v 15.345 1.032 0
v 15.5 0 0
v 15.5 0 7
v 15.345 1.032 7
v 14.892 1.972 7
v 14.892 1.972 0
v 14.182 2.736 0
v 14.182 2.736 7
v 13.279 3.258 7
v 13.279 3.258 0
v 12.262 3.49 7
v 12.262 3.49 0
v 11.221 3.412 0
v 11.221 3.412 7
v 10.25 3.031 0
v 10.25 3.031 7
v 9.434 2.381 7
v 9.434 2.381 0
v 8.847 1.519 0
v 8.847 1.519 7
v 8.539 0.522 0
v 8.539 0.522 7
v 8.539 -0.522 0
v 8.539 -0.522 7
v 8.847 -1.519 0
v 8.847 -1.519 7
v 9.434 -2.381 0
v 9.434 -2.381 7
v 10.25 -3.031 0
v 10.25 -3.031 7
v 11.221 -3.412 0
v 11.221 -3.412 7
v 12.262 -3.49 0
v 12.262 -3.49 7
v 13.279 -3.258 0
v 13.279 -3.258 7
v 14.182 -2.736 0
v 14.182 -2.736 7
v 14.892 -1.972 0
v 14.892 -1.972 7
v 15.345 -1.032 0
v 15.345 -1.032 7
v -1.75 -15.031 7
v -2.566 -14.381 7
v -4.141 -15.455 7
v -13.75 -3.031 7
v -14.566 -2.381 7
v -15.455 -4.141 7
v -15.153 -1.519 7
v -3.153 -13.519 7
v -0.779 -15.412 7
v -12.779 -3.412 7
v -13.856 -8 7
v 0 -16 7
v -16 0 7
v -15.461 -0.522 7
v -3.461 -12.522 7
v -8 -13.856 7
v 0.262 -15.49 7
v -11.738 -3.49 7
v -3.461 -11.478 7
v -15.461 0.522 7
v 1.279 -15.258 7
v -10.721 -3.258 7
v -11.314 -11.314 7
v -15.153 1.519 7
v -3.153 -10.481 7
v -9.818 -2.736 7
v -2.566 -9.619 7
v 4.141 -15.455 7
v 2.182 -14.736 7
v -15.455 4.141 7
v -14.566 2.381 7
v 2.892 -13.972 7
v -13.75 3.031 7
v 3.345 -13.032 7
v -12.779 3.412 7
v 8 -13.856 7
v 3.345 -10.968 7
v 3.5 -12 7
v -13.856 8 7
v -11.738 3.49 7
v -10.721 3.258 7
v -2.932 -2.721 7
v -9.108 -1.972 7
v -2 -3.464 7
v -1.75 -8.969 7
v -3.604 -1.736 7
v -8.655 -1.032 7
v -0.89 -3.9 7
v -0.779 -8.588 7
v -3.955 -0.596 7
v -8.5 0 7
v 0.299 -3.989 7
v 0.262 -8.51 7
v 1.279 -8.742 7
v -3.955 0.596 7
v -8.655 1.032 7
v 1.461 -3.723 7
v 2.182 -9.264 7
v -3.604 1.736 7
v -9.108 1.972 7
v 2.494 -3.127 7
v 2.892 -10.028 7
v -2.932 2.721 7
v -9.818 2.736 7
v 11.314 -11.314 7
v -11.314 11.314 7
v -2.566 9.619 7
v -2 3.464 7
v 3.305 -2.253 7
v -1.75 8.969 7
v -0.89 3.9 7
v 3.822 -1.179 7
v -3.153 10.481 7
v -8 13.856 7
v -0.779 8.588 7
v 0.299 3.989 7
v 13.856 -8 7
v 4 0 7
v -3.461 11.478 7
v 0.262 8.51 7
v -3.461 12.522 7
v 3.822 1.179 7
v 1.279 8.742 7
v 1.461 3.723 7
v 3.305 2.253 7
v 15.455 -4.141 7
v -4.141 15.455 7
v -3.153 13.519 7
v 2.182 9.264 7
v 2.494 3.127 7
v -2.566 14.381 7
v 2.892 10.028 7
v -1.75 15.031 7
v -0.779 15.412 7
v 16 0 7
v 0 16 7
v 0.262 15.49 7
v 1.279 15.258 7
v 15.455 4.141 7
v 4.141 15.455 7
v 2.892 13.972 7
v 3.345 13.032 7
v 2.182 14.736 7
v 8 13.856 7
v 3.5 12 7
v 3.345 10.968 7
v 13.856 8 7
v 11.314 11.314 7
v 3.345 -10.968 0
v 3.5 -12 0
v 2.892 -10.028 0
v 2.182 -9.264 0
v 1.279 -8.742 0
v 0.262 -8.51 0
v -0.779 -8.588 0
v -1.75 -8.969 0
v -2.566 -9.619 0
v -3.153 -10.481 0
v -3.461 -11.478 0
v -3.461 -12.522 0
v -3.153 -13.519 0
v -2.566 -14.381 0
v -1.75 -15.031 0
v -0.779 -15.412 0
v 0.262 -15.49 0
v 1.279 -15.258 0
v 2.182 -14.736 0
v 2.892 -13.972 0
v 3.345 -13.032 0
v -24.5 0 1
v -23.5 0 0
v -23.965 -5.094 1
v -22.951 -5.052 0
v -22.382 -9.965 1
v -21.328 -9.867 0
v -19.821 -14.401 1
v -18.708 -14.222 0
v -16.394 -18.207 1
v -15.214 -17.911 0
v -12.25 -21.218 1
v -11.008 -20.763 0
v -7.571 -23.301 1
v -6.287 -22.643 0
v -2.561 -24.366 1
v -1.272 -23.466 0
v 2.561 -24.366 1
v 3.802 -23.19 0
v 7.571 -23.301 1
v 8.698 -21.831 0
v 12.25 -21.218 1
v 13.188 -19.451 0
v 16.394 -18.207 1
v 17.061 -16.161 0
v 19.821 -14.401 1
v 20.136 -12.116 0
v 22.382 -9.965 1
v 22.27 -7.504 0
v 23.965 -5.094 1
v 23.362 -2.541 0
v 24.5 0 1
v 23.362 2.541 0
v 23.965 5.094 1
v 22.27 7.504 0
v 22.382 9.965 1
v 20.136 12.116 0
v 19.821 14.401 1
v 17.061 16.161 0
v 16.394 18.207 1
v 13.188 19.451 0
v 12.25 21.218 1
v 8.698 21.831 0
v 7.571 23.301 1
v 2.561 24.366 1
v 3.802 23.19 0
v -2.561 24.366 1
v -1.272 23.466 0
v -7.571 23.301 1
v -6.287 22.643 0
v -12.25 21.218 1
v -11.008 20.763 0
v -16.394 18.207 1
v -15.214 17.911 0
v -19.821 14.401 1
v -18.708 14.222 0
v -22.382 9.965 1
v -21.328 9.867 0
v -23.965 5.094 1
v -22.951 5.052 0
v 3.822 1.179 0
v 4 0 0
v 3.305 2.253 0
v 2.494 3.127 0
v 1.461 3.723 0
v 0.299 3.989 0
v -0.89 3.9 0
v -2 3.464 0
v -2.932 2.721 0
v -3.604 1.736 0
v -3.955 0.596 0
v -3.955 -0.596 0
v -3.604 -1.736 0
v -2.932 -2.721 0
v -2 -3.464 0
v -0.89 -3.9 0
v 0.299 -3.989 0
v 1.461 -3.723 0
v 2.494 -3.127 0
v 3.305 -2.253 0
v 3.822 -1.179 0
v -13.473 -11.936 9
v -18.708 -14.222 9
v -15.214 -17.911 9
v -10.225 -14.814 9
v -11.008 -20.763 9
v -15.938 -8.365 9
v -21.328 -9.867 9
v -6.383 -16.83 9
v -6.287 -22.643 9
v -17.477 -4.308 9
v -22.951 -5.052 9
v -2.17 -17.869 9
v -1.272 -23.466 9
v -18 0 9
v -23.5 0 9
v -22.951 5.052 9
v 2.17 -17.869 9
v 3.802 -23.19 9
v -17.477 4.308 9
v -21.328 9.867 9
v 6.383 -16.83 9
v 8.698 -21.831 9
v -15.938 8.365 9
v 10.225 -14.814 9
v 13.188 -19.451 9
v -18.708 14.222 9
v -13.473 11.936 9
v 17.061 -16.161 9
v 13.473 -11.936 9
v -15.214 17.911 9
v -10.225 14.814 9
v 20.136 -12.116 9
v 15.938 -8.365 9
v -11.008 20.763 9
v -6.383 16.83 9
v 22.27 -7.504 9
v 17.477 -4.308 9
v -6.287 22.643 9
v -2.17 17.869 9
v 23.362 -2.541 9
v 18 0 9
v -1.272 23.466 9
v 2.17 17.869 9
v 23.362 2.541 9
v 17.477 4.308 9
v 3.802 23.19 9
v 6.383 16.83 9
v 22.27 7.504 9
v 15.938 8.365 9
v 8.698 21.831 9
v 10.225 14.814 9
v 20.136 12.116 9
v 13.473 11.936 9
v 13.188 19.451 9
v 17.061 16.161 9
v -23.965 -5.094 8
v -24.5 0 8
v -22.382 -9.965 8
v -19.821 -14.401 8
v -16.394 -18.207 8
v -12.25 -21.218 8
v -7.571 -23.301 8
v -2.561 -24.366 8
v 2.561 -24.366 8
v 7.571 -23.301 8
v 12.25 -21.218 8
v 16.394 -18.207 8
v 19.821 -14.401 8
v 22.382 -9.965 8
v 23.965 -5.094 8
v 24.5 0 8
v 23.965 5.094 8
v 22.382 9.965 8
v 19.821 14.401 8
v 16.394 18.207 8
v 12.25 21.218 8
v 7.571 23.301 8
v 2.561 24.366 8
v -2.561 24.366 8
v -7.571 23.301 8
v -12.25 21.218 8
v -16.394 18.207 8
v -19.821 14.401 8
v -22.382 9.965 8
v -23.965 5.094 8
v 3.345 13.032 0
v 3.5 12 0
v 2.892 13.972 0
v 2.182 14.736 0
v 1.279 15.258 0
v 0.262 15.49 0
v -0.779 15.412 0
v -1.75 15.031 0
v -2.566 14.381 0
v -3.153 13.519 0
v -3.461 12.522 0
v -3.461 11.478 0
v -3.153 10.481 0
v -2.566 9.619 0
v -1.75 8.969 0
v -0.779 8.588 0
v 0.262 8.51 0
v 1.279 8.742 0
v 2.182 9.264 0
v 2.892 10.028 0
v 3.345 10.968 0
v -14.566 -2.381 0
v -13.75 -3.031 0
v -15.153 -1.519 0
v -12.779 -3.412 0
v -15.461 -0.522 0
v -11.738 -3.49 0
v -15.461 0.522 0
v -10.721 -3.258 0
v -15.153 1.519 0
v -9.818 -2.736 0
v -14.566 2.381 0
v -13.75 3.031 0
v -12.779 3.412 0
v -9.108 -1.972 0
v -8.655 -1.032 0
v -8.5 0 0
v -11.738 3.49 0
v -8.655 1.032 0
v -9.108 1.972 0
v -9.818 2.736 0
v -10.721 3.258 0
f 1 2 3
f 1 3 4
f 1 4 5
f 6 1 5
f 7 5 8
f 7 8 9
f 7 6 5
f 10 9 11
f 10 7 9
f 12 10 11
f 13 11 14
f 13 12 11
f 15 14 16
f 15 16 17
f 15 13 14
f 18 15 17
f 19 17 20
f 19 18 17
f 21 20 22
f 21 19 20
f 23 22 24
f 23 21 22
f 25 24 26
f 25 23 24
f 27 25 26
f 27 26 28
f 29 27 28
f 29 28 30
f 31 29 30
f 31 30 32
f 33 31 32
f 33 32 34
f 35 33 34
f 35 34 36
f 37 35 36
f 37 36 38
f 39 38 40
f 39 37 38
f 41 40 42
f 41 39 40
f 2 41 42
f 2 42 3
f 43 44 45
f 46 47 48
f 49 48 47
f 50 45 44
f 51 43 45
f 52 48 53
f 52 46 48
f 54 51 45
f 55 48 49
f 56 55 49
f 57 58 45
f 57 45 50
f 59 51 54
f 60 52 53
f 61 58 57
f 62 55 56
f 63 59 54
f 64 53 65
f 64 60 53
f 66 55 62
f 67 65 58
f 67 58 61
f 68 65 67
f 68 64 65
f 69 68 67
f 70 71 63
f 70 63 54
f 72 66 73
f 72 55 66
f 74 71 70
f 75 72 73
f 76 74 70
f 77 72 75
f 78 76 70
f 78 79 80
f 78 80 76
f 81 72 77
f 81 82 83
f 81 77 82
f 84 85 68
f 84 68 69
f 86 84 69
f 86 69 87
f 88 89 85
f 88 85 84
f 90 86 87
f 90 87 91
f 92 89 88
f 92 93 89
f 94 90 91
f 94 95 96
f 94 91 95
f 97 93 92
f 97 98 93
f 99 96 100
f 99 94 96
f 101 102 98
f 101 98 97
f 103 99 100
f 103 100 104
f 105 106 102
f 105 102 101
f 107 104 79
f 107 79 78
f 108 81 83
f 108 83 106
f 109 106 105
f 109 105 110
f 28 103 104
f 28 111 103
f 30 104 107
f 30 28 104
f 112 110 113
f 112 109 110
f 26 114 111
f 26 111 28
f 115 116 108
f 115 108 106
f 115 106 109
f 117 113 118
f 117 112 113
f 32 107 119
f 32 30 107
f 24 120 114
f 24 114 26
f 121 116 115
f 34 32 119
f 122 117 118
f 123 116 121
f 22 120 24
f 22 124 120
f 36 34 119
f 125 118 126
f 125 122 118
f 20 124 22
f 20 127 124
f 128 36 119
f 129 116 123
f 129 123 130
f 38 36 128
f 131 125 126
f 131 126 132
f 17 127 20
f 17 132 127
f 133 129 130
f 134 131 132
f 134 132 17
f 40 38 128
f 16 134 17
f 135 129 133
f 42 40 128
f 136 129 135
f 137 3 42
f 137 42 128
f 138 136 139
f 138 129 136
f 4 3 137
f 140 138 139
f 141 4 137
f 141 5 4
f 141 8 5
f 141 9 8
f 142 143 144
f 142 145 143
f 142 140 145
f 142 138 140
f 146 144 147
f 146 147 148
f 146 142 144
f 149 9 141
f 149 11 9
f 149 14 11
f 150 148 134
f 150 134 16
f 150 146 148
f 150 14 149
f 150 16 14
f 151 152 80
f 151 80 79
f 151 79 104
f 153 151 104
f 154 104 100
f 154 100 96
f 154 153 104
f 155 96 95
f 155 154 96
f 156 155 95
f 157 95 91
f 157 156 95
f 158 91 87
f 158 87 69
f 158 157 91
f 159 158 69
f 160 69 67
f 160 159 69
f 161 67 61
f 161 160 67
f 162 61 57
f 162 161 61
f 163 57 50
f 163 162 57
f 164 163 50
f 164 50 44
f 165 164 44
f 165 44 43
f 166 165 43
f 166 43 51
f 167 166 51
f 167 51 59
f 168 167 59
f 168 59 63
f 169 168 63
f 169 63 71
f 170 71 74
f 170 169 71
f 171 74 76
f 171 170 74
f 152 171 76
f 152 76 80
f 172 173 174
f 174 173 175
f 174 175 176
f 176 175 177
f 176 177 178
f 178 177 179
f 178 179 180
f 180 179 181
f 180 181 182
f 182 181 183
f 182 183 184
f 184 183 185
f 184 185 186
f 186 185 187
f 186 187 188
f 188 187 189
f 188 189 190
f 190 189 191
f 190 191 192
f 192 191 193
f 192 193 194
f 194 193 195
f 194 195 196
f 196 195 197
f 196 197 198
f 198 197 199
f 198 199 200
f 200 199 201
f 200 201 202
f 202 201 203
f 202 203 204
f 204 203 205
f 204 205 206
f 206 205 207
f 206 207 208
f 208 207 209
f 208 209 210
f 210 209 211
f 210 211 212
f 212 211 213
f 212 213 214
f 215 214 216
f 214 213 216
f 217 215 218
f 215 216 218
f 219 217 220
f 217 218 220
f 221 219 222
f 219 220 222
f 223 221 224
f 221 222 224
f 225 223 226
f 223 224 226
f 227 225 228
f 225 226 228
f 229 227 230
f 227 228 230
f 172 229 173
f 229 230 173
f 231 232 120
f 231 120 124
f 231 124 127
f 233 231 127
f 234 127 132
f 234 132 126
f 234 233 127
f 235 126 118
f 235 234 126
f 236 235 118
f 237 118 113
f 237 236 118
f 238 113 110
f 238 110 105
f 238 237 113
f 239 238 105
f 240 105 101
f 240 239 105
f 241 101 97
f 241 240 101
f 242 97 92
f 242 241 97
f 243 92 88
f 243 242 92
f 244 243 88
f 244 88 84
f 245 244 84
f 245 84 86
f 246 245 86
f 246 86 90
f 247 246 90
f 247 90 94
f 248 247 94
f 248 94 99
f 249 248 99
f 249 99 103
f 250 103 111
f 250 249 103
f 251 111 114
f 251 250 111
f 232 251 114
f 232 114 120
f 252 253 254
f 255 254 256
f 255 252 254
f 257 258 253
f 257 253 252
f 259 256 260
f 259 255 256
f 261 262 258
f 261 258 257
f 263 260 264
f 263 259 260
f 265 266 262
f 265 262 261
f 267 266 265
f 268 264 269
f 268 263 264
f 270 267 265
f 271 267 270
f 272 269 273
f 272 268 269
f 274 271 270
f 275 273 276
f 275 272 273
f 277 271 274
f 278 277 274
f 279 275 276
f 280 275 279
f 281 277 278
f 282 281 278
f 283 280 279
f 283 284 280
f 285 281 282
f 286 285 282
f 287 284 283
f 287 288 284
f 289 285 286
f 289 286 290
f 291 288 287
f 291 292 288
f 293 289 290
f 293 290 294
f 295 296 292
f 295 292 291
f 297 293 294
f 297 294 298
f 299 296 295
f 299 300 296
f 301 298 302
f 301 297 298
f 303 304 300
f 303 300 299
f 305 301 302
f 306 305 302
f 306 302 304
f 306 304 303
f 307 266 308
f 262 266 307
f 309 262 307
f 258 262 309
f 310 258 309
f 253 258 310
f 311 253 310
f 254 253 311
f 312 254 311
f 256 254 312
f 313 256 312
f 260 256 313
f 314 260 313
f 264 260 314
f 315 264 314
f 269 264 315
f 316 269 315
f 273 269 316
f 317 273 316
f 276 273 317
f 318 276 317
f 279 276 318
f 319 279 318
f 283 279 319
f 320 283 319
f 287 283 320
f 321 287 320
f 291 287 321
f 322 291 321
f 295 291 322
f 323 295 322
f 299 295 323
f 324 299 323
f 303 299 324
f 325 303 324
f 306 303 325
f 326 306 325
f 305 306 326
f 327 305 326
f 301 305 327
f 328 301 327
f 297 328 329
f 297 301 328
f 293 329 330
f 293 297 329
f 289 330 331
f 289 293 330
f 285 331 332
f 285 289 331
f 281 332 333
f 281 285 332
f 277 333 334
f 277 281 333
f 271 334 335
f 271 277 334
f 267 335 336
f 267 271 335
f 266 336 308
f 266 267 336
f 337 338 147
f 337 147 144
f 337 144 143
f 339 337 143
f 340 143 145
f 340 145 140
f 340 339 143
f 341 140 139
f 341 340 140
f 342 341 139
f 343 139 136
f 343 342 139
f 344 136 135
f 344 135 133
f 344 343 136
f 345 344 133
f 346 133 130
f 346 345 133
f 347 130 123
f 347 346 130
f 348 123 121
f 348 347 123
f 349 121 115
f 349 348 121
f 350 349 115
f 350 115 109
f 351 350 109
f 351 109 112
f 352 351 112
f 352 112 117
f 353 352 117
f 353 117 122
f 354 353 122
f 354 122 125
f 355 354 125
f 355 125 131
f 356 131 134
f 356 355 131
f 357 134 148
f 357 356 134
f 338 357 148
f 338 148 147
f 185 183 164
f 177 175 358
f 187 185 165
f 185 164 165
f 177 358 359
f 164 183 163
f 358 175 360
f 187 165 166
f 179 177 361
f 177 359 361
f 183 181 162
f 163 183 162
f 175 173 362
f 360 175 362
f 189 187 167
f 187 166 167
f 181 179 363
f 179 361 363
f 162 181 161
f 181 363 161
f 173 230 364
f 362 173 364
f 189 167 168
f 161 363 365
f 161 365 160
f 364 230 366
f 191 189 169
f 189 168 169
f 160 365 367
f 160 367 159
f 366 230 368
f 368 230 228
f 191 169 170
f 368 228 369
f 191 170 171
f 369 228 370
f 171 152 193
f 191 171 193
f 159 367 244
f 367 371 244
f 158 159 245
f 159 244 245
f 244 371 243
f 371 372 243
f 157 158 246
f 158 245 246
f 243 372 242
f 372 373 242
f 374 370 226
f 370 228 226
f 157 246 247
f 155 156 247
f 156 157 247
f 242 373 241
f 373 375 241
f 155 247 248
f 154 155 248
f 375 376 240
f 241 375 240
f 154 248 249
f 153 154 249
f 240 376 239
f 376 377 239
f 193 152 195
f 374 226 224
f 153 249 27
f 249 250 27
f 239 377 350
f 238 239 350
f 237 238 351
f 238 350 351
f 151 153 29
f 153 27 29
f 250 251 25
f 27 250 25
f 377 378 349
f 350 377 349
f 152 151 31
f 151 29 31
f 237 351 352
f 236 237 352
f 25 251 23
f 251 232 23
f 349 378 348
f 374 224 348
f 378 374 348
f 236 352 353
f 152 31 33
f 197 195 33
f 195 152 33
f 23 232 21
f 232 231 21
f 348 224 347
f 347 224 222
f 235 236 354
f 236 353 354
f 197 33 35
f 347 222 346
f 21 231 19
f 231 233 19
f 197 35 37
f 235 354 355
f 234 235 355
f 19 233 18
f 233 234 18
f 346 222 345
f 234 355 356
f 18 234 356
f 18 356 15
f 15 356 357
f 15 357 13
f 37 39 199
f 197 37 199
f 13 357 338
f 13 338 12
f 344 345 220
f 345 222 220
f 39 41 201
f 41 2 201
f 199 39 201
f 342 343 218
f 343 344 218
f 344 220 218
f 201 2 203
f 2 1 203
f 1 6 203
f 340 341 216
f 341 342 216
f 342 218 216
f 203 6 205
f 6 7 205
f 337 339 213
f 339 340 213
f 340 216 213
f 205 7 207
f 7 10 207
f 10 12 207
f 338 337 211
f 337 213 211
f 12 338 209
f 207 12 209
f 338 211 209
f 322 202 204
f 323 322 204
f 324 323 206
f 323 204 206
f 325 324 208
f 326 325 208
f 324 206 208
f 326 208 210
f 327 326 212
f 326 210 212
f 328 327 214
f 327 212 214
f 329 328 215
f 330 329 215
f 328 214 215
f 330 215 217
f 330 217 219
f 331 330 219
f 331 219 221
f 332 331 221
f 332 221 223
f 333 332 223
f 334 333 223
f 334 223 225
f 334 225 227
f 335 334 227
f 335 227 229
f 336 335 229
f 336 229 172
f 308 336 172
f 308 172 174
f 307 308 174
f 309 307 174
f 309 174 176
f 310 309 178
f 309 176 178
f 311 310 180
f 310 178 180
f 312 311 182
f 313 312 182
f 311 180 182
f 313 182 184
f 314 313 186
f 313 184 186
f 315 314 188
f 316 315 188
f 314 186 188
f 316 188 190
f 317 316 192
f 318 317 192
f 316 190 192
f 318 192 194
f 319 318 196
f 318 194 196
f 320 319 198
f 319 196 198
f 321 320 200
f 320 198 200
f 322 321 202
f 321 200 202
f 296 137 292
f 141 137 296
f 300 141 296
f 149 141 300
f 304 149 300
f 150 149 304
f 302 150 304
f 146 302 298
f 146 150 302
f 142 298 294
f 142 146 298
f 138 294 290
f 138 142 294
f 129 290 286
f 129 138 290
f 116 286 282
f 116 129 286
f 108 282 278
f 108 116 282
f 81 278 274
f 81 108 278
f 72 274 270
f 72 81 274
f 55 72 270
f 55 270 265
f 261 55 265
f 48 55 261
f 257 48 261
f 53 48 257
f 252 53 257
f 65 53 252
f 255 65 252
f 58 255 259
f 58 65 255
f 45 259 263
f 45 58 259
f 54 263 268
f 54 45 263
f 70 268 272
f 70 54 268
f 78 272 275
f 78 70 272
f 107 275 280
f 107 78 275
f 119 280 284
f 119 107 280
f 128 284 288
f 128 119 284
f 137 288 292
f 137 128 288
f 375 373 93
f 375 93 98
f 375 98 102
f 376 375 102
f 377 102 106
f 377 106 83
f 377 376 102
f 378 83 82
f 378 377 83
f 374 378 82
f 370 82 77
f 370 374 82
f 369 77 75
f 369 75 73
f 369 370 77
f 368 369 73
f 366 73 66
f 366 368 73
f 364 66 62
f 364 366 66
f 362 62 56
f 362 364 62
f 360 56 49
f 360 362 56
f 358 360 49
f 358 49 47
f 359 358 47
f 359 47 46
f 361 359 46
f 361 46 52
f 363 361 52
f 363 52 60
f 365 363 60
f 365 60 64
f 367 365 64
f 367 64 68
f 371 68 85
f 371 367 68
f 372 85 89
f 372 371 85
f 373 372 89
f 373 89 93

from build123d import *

# Parameters (mm, degrees)
SKETCH1_R           = 24.5
SKETCH1_R_2         = 18
BOSS_EXTRUDE1_DEPTH = 9
SKETCH1_3_R         = 18
SKETCH1_3_R_2       = 3.5
SKETCH1_3_R_3       = 4
BOSS_EXTRUDE2_DEPTH = 7


with BuildPart() as part:
    # Sketch1 → Boss-Extrude1 (new body)
    with BuildSketch(Plane.XY):
        Circle(SKETCH1_R)
        Circle(SKETCH1_R_2, mode=Mode.SUBTRACT)
    extrude(amount=BOSS_EXTRUDE1_DEPTH)

    # Sketch1<3> → Boss-Extrude2 (add)
    with BuildSketch(Plane.XY):
        Circle(SKETCH1_3_R)
        with Locations((0, -12)):
            Circle(SKETCH1_3_R_2, mode=Mode.SUBTRACT)
        Circle(SKETCH1_3_R_3, mode=Mode.SUBTRACT)
        with Locations((12, 0)):
            Circle(SKETCH1_3_R_2, mode=Mode.SUBTRACT)
        with Locations((-12, 0)):
            Circle(SKETCH1_3_R_2, mode=Mode.SUBTRACT)
        with Locations((0, 12)):
            Circle(SKETCH1_3_R_2, mode=Mode.SUBTRACT)
    extrude(amount=BOSS_EXTRUDE2_DEPTH)

    # Sketch3 → Revolve2 (revolve)
    with BuildSketch(Plane(origin=(0, 0, 0), x_dir=(1, 0, 0), z_dir=(0, 1, 0))):
        Polygon((-18, -9), (-16, -7), (-18, -7), align=None)
    revolve(axis=Axis((0, 0, -3.771799992), (0, 0, 1)))

    # Sketch4 → Cut-Revolve1 (revolve, cut)
    with BuildSketch(Plane(origin=(0, 0, 0), x_dir=(1, 0, 0), z_dir=(0, 1, 0))):
        Polygon((-24.5, -8), (-23.5, -9), (-24.5, -9), align=None)
        Polygon((-24.5, -1), (-23.5, 0), (-24.5, 0), align=None)
    revolve(axis=Axis((0, 0, -7.551154296), (0, 0, 1)), mode=Mode.SUBTRACT)


solid = part.part
